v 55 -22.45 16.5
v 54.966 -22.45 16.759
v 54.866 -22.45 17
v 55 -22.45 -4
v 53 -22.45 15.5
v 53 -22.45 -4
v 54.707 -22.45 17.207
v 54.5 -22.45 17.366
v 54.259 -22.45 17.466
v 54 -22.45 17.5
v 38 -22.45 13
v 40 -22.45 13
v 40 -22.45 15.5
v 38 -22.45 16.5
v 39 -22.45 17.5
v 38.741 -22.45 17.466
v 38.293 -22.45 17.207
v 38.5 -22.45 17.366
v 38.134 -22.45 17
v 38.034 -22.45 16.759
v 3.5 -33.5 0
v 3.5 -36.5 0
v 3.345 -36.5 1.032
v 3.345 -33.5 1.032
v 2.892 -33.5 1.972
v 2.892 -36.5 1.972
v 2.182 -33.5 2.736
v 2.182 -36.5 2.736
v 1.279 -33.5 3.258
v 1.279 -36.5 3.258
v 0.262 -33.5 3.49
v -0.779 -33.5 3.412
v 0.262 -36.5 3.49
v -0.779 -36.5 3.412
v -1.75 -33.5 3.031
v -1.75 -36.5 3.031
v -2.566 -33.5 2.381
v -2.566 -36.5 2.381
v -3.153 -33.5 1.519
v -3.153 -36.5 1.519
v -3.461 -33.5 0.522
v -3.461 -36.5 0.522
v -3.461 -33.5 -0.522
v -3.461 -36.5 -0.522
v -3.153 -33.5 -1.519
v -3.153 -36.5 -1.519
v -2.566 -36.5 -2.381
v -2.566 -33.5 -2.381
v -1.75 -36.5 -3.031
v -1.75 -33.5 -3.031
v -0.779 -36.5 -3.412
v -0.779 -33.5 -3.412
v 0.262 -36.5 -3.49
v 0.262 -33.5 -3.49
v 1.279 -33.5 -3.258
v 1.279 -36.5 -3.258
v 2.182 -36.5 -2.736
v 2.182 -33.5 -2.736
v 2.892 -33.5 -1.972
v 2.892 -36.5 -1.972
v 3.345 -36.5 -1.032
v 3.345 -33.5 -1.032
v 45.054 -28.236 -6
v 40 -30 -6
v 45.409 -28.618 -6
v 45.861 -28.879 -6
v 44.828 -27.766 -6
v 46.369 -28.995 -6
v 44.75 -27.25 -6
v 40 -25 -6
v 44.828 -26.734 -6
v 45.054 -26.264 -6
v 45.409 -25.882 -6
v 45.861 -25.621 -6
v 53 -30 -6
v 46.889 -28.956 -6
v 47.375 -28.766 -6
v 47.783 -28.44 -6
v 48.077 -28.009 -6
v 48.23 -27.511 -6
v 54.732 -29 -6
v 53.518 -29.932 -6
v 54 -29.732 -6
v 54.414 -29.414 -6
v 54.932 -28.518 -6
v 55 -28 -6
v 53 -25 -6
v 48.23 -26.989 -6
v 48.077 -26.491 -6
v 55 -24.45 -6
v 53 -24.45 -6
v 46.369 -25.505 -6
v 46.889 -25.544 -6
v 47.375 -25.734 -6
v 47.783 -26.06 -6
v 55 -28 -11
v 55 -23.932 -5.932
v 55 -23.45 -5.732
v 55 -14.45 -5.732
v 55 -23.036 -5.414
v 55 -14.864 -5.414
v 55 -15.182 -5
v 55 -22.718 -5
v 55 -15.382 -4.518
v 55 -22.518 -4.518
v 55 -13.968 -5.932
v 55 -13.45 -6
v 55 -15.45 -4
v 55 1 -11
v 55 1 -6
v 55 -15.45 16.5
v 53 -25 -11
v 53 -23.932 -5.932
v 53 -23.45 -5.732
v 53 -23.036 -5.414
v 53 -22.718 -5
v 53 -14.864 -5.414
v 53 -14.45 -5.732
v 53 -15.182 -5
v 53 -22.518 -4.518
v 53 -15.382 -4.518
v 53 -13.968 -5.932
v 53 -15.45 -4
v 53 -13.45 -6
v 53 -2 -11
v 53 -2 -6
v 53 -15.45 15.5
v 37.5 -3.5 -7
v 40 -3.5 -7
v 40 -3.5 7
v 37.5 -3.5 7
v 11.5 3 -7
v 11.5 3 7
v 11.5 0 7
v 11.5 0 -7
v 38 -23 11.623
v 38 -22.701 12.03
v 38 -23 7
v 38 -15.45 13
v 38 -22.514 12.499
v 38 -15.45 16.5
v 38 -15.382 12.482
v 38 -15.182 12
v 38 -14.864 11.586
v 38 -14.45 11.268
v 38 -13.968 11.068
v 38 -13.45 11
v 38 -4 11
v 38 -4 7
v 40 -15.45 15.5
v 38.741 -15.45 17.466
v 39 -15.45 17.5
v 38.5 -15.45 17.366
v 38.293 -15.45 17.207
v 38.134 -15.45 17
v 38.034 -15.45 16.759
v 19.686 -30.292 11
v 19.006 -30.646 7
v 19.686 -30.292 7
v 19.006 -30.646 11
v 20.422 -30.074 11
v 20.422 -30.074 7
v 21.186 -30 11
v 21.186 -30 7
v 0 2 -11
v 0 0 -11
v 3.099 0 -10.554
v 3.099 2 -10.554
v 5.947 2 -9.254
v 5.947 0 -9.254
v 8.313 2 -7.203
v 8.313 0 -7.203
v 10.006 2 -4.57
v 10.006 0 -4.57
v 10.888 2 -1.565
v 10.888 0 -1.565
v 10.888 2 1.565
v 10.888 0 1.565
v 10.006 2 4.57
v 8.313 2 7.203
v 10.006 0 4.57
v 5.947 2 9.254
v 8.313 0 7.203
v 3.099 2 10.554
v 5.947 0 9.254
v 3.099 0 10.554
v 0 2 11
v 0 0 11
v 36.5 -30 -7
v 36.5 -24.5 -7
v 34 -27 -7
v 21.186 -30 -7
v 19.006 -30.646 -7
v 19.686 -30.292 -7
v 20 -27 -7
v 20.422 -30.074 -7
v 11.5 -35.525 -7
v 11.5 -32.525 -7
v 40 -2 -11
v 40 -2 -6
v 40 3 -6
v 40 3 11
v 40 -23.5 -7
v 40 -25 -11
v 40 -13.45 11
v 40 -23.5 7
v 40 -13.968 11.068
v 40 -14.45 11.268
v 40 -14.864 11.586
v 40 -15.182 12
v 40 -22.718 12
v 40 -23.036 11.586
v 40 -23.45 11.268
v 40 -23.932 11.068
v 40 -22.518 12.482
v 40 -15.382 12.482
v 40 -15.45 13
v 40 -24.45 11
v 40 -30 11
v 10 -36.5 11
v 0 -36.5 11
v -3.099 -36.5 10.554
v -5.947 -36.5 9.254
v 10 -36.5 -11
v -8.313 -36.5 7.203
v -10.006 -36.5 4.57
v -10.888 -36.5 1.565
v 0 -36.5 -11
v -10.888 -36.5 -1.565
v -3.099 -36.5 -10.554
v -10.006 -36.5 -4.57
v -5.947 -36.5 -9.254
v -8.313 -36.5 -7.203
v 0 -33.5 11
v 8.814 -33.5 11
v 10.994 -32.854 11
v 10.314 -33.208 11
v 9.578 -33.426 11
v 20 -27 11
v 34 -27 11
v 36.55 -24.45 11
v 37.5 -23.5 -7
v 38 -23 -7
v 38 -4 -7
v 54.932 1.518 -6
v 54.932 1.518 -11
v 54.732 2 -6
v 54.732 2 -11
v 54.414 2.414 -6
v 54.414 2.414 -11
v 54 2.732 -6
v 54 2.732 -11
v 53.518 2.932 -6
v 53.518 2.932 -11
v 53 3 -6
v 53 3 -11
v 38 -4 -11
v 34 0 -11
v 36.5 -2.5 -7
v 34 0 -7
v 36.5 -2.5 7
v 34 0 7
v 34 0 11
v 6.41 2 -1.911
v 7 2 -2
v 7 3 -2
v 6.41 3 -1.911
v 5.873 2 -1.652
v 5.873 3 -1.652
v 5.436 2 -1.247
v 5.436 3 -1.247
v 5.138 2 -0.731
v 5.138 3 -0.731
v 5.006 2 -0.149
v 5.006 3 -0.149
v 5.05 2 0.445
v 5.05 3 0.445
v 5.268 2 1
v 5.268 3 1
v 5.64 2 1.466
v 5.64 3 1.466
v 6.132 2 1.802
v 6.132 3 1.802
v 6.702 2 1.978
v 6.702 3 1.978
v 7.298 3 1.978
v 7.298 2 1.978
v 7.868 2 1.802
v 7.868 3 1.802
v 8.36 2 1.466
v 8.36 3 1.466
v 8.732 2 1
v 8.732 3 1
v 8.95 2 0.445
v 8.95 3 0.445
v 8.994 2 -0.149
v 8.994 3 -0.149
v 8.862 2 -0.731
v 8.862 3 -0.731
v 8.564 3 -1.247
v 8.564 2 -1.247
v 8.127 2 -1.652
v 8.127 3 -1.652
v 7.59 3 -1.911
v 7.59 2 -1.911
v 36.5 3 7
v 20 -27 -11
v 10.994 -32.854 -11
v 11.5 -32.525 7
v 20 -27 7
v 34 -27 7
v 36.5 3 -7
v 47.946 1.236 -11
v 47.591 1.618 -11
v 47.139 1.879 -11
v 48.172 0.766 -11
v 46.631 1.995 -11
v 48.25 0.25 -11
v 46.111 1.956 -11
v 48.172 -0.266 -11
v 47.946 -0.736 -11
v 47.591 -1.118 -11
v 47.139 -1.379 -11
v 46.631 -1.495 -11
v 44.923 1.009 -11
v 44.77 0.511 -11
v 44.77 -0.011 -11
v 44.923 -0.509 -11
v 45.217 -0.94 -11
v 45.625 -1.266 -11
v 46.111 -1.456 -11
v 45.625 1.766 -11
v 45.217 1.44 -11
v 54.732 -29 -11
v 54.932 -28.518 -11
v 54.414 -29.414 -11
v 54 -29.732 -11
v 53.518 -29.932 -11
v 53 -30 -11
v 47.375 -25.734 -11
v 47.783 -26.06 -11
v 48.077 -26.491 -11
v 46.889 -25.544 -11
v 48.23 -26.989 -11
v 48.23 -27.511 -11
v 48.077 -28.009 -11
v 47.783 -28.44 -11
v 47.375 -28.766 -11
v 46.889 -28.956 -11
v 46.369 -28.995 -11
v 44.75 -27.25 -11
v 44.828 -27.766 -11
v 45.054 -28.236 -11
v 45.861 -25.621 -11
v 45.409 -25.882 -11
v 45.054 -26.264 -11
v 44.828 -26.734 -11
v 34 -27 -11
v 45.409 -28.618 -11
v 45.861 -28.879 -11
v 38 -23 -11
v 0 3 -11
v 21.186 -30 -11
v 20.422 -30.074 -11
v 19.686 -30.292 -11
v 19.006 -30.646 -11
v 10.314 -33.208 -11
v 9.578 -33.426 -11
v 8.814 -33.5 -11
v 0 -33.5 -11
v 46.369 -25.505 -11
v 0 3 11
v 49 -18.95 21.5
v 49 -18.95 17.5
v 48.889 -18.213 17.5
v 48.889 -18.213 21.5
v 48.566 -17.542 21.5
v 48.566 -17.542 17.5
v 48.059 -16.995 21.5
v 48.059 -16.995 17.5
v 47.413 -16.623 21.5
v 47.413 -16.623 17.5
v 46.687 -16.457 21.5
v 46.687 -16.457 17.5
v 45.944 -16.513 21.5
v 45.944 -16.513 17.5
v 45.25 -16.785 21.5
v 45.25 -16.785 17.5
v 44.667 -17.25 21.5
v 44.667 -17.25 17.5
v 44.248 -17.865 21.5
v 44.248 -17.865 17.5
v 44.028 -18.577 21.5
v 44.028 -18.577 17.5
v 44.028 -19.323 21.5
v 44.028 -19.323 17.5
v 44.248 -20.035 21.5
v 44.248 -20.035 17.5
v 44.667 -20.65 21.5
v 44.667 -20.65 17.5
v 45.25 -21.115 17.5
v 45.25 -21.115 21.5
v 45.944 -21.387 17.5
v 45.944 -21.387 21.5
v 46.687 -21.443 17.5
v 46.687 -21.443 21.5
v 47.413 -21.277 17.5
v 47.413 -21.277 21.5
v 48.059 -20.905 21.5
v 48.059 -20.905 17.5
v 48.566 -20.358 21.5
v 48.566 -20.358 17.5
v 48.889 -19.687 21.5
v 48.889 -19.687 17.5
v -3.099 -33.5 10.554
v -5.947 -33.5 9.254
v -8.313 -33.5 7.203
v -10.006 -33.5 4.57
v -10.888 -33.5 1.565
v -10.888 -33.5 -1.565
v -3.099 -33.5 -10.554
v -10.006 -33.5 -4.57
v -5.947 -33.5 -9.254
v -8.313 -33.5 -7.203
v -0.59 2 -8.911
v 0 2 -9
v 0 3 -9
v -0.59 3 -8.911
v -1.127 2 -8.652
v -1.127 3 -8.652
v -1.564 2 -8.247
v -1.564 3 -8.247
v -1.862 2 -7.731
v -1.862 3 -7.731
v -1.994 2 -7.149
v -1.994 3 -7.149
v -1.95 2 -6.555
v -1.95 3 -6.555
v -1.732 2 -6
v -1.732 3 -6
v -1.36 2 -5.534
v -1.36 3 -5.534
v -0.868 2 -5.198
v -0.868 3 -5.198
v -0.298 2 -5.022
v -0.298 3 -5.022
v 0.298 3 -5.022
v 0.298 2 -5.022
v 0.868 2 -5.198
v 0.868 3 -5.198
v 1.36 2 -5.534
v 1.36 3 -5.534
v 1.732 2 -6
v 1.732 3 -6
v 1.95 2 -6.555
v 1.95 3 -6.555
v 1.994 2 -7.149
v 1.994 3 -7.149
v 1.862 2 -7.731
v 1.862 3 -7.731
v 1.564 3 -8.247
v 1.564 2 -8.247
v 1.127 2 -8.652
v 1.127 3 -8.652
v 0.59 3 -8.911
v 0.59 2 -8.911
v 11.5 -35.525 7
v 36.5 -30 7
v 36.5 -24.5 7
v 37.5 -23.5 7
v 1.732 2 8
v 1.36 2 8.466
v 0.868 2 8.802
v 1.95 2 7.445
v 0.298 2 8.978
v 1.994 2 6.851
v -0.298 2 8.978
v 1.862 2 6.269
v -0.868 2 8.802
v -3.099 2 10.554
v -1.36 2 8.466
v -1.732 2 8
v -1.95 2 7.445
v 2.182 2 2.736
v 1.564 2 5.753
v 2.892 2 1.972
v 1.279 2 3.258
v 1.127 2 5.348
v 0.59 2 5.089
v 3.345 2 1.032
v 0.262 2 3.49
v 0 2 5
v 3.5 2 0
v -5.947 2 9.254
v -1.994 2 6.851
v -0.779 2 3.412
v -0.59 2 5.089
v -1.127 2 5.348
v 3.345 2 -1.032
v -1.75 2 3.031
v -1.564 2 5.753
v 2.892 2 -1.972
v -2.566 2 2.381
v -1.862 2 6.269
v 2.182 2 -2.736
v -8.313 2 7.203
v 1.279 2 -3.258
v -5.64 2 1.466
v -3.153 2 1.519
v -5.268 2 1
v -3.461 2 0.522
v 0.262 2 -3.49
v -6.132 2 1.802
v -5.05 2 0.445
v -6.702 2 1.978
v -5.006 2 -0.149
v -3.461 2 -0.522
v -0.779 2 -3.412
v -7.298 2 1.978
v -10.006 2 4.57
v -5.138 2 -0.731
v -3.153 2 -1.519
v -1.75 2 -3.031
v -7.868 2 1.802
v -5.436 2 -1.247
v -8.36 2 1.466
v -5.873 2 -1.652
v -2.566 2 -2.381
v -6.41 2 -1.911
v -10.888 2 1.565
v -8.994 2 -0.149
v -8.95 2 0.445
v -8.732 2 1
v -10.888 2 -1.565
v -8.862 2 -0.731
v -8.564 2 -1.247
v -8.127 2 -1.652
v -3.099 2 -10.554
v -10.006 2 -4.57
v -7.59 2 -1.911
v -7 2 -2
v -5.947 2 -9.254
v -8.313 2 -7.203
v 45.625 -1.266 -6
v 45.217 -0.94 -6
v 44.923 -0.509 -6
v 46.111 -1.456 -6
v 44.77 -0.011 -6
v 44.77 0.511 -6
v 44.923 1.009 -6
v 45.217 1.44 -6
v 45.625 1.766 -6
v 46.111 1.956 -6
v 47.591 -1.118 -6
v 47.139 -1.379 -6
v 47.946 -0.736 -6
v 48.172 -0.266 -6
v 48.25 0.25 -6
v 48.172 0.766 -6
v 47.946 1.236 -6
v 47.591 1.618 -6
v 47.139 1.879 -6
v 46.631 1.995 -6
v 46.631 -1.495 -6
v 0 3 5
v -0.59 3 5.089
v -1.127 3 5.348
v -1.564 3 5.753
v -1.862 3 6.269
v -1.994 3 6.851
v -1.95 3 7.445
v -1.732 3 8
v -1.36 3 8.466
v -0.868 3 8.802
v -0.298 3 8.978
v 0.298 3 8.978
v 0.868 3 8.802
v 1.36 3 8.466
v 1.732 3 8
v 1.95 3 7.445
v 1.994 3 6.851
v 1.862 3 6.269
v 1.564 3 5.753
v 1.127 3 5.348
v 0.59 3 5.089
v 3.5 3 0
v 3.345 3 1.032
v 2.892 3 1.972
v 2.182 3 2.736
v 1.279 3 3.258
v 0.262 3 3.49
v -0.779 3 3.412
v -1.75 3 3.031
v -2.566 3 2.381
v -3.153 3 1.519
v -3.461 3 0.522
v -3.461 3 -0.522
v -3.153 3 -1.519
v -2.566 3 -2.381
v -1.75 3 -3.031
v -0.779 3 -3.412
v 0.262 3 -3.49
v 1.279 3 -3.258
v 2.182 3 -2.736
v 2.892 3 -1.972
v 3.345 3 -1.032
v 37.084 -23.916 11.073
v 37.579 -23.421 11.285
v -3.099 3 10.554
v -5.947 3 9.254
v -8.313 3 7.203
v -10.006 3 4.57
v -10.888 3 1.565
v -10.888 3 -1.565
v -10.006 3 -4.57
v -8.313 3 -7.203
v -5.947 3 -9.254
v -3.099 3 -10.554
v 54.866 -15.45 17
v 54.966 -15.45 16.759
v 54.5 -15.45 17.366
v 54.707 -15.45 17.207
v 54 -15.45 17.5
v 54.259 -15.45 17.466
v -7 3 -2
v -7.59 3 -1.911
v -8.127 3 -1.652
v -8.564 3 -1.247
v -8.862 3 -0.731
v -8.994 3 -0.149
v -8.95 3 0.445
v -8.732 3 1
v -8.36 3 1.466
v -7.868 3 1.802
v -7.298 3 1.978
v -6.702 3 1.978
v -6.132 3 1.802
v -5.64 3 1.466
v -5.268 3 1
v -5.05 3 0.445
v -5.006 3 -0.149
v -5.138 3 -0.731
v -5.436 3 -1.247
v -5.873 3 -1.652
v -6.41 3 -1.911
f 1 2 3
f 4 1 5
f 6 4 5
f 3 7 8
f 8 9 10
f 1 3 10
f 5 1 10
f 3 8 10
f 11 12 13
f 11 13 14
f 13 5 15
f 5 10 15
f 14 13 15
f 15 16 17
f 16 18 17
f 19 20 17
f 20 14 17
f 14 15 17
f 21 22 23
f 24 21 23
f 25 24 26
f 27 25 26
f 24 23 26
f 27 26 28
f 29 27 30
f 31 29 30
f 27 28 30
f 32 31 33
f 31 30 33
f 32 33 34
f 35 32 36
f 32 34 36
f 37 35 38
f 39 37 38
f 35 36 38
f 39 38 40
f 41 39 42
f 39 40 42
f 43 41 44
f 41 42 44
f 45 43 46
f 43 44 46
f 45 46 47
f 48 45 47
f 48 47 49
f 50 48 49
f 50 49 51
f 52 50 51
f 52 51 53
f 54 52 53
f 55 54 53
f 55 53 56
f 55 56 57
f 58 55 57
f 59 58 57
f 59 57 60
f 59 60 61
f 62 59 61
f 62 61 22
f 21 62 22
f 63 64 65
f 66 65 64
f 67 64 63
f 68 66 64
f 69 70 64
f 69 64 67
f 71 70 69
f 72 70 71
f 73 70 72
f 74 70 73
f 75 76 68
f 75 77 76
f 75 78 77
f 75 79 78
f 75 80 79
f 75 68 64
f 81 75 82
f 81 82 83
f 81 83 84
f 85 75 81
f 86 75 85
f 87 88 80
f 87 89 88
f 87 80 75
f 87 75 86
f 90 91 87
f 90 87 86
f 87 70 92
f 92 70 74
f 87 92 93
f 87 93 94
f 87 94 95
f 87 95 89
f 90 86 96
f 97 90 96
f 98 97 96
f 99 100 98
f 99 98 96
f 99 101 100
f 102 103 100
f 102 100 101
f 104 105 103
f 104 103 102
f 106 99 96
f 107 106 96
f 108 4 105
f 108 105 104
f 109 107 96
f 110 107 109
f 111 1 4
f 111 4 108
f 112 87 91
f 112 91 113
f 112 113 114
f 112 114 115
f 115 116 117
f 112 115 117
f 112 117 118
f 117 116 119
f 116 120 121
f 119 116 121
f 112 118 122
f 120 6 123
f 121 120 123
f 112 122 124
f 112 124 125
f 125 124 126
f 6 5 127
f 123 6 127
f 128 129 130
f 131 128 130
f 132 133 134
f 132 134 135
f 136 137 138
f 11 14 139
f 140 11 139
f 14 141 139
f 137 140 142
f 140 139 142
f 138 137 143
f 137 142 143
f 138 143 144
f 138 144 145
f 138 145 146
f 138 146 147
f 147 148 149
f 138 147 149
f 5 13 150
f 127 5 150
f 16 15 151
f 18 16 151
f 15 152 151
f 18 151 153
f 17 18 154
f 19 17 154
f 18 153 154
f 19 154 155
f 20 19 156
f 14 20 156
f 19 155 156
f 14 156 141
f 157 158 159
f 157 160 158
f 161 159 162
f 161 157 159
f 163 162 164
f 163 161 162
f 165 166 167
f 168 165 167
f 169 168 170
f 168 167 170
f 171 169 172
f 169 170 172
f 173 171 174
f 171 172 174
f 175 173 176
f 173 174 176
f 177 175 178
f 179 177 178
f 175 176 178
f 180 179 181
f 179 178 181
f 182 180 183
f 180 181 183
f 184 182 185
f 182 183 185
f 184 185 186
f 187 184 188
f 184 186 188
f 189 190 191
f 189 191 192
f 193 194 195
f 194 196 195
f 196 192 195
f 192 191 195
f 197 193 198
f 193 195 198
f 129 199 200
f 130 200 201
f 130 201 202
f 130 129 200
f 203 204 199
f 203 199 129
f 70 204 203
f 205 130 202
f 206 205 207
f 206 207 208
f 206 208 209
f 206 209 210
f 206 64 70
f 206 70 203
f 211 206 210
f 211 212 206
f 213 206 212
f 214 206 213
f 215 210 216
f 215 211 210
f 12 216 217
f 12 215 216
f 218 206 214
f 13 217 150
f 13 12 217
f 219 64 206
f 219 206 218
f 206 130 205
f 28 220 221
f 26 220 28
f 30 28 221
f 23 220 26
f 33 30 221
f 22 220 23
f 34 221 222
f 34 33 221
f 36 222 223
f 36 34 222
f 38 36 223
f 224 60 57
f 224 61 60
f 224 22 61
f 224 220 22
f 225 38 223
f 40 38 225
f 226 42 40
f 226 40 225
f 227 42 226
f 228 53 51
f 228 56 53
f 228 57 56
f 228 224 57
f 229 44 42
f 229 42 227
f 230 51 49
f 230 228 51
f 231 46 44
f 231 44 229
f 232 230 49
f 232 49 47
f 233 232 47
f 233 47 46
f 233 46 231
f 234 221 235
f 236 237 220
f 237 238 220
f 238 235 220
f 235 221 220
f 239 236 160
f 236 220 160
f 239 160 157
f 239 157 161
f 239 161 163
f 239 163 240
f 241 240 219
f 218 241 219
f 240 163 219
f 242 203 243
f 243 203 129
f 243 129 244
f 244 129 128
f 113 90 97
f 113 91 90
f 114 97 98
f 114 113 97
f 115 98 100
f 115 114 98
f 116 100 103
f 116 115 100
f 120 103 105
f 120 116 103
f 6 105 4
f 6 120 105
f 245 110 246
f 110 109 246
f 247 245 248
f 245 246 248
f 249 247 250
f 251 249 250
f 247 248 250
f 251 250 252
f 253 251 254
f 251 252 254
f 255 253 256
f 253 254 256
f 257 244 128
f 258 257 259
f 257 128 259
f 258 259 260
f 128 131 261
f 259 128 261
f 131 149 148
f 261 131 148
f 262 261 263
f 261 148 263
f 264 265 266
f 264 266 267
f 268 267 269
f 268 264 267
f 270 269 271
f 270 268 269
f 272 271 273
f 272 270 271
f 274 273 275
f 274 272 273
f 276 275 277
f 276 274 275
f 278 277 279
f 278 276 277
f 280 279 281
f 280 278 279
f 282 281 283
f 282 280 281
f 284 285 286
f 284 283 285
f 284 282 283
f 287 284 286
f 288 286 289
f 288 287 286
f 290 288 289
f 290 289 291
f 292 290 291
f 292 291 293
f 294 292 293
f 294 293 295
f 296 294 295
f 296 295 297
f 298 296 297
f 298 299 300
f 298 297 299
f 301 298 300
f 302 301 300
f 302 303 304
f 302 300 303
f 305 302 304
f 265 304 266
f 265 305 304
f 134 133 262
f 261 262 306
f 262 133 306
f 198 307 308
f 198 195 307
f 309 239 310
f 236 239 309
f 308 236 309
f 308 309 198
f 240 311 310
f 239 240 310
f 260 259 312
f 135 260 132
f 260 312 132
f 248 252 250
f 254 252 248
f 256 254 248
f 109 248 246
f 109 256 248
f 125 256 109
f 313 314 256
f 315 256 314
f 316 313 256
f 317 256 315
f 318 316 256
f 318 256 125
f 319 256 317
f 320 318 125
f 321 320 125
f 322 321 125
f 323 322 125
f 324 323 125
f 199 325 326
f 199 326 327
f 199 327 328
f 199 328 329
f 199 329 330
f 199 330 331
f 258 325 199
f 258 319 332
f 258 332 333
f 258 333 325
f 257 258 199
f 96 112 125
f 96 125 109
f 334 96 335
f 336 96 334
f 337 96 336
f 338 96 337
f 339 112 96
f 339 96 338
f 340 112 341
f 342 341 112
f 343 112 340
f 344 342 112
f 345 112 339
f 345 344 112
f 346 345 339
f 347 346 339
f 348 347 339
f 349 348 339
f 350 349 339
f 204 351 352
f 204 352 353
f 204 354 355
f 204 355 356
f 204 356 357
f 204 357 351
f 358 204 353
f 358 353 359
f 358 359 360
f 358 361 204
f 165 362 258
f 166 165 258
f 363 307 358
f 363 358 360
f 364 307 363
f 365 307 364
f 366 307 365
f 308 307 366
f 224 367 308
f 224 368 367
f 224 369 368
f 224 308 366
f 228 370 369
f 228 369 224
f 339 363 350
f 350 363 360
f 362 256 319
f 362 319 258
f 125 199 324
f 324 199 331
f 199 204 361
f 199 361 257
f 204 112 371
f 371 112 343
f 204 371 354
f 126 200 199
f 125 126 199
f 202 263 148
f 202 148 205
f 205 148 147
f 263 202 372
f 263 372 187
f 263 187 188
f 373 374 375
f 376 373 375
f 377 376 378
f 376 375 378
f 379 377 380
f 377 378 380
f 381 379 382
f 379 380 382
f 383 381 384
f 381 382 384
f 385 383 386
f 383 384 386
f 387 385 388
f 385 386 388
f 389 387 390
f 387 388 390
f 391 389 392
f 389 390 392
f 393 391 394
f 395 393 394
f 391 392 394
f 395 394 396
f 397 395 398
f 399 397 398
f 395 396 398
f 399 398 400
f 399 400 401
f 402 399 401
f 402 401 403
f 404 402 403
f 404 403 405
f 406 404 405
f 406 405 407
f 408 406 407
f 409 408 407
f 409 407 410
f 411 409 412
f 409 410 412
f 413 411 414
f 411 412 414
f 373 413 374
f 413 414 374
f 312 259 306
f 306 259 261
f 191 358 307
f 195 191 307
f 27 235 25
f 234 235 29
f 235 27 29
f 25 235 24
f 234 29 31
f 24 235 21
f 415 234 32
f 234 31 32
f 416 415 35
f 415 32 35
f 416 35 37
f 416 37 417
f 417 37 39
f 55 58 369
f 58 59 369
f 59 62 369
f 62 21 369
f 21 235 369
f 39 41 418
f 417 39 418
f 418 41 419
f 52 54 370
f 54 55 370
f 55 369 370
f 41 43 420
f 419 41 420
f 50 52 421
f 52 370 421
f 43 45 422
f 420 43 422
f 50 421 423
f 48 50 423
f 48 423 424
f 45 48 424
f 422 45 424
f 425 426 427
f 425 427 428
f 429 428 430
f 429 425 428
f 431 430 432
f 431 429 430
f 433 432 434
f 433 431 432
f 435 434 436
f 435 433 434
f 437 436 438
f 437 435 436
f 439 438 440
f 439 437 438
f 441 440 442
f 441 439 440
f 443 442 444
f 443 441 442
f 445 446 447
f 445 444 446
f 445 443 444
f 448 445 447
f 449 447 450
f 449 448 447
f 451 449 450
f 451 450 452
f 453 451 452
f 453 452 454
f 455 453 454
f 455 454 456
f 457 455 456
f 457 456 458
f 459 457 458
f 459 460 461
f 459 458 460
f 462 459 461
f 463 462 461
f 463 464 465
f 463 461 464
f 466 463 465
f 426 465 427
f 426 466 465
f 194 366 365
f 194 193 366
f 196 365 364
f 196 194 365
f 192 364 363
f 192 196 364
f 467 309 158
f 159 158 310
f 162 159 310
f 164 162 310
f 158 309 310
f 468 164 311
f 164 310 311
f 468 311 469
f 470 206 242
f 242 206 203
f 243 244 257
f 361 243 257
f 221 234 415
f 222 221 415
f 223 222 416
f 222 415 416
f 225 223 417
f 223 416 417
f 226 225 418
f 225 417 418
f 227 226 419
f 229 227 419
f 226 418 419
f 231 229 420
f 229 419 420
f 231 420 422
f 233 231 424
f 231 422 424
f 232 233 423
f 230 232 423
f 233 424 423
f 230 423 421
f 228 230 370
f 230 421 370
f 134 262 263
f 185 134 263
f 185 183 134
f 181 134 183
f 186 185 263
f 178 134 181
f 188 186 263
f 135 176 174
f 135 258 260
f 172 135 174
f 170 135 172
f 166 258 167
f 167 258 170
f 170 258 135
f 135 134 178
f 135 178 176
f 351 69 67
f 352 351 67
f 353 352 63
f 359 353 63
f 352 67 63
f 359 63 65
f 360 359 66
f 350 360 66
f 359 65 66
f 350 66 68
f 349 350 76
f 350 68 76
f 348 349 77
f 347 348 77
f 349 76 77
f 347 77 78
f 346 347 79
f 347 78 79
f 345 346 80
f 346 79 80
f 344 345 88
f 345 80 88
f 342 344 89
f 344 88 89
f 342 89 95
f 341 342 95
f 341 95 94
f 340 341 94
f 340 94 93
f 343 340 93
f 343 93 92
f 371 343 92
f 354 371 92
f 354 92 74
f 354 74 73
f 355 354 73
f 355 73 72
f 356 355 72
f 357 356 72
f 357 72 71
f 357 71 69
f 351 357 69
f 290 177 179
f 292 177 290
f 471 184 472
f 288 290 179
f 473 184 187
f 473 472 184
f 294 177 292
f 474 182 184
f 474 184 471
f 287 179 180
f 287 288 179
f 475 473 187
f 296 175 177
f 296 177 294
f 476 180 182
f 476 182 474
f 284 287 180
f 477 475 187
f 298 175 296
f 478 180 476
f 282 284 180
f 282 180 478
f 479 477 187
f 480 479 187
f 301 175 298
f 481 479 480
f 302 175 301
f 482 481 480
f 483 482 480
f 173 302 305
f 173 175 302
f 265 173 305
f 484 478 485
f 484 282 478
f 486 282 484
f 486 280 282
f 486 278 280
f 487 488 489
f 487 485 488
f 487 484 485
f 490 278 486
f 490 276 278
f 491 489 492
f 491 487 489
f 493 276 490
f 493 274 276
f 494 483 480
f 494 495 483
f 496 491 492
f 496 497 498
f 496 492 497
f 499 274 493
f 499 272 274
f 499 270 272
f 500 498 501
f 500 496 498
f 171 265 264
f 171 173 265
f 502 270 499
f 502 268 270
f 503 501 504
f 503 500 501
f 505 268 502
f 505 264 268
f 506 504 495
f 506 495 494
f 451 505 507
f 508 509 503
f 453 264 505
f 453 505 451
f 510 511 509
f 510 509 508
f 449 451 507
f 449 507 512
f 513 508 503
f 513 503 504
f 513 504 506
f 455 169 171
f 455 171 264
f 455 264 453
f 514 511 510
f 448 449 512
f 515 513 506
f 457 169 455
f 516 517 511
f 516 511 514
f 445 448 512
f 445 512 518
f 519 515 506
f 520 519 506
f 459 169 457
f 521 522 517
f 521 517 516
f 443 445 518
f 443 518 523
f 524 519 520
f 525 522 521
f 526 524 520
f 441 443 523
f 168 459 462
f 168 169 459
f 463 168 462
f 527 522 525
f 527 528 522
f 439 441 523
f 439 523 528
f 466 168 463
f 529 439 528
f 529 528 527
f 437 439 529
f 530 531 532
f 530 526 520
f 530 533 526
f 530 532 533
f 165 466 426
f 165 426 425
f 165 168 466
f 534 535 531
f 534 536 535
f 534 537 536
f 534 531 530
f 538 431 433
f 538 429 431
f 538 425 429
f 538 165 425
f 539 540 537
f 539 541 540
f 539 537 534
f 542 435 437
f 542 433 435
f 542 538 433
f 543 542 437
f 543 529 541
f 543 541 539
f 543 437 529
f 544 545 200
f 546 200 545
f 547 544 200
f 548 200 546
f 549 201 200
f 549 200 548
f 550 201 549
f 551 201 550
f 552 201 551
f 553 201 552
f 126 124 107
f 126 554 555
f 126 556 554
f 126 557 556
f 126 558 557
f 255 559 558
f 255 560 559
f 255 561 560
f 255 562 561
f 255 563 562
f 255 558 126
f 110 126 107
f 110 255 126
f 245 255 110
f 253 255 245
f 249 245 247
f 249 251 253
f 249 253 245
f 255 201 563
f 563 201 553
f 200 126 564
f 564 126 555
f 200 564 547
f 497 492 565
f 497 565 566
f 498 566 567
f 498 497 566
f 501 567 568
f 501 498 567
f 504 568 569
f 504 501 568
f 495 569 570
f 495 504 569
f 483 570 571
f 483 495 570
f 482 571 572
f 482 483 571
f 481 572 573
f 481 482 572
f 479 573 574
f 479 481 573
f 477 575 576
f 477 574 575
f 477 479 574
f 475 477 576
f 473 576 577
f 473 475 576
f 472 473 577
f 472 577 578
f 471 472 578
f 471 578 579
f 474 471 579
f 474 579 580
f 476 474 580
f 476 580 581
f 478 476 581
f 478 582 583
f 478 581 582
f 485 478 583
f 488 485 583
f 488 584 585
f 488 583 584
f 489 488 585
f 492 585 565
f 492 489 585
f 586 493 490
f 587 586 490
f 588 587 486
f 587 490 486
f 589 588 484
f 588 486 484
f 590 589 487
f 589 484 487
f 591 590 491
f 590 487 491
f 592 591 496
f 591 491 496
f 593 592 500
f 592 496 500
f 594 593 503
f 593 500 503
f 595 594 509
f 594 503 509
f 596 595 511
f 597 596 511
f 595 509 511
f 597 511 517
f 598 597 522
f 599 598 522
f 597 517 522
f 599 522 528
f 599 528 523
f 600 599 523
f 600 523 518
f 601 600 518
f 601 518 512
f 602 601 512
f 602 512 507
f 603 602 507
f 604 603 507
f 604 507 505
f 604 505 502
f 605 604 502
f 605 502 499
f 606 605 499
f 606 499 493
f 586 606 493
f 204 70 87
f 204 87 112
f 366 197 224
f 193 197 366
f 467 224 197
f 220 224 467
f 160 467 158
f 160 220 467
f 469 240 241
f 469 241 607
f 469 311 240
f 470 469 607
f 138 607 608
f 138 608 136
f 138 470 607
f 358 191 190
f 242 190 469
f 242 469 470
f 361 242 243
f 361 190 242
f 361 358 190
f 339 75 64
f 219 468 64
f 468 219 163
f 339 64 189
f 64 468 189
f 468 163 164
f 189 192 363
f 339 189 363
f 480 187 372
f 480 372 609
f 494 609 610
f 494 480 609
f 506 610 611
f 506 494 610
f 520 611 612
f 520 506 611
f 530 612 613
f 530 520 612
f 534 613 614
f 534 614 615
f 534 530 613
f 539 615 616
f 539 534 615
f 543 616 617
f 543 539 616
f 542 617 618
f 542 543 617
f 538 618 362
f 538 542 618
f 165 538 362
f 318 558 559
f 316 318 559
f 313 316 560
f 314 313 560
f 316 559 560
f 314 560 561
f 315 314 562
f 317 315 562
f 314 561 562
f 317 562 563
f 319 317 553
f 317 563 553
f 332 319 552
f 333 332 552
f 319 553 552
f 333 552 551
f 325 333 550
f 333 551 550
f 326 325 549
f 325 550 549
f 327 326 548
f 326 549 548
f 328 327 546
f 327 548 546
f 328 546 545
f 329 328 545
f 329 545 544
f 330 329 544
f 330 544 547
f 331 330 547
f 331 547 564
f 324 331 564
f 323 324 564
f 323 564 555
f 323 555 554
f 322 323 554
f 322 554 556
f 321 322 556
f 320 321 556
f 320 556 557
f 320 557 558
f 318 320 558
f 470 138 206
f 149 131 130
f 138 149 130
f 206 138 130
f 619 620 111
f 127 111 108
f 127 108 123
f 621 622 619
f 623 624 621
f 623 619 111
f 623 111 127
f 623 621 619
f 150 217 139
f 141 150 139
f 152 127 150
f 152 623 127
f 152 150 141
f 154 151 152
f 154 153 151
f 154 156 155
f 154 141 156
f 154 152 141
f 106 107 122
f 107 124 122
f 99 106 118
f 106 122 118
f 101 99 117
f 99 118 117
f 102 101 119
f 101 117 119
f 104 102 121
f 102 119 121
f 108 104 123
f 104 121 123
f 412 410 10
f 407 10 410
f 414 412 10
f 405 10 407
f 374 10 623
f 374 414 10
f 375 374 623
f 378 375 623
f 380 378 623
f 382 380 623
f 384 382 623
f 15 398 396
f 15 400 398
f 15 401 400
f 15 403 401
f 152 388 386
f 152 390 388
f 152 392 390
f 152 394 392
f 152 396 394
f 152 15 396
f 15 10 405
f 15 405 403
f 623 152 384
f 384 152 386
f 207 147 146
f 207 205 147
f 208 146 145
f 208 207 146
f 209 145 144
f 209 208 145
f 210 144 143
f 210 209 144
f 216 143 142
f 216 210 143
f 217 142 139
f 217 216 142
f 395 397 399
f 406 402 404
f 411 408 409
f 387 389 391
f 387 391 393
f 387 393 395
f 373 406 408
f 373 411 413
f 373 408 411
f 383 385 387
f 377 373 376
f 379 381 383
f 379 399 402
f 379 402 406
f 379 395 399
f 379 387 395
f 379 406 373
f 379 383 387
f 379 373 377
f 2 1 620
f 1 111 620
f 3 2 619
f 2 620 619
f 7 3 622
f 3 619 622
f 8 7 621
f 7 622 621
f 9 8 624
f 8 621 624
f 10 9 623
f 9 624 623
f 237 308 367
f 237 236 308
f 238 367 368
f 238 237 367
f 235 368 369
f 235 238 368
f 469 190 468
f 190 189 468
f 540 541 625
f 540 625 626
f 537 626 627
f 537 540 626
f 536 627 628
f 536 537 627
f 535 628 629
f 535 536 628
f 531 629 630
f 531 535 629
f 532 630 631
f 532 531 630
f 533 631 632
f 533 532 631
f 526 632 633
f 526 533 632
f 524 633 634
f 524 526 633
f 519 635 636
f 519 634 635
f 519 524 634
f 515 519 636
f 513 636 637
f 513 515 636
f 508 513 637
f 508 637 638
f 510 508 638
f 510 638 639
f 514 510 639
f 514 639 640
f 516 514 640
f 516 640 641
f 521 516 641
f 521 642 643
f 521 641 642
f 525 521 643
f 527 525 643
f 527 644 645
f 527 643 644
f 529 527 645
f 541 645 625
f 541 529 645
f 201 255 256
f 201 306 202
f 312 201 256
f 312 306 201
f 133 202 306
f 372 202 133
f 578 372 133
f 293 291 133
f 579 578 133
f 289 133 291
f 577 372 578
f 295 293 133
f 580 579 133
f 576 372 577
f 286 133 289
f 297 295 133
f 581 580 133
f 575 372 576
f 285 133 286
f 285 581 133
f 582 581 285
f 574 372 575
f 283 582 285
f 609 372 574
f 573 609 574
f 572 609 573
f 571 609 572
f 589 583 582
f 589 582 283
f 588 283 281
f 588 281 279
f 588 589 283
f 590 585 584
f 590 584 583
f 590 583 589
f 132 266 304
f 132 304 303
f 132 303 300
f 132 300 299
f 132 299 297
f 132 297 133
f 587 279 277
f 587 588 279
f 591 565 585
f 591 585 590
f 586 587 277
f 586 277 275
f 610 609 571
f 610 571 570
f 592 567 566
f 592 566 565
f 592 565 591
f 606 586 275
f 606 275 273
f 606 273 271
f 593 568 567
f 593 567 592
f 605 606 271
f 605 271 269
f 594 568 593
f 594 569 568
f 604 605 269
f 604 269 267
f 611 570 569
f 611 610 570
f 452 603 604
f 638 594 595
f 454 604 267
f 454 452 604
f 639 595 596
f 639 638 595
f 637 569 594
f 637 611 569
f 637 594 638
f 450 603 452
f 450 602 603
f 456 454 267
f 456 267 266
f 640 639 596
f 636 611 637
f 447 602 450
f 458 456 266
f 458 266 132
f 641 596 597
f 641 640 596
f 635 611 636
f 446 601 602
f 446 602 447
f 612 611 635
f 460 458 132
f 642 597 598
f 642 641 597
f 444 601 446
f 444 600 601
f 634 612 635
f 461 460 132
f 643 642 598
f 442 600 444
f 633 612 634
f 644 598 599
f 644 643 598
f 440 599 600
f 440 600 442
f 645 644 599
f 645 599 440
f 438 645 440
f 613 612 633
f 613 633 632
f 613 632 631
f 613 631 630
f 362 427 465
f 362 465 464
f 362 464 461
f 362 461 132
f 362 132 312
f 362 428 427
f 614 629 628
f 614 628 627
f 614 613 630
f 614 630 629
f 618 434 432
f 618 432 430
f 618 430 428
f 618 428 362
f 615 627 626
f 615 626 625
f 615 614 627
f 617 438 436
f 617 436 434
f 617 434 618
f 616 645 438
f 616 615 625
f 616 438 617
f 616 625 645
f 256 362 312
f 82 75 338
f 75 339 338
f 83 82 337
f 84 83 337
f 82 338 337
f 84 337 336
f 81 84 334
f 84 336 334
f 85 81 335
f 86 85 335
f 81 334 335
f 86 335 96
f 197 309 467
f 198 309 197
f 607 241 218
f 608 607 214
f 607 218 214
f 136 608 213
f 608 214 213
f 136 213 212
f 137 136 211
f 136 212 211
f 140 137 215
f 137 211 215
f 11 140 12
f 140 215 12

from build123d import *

# Parameters (mm, degrees)
EXTRUDE_1_DEPTH             = 3
SKETCH_3_R                  = 11
CUT_EXTRUDE_1_DEPTH         = 2
CUT_EXTRUDE_2_DEPTH         = 20
CUT_EXTRUDE_2_DEPTH_BACK    = 42.593268686
SKETCH_1_R                  = 3
SKETCH_1_R_2                = 2
EXTRUDE_2_DEPTH             = 3
SKETCH_5_R                  = 3.5
CUT_EXTRUDE_3_DEPTH         = 58.282196187
SKETCH_8_W                  = 20
SKETCH_8_H                  = 22
EXTRUDE_4_DEPTH             = 3
EXTRUDE_5_REACH             = 57.256
EXTRUDE_5_DIRECTION_2_REACH = 57.256
SKETCH_11_W                 = 5
SKETCH_11_H                 = 5
EXTRUDE_6_DEPTH             = 15
EXTRUDE_6_2_DEPTH           = 15
SKETCH_13_W                 = 2
SKETCH_13_H                 = 22
EXTRUDE_7_DEPTH             = 33
SKETCH_15_W                 = 2
SKETCH_15_H                 = 5
EXTRUDE_8_DEPTH             = 28
SKETCH_14_R                 = 1.75
CUT_EXTRUDE_4_DEPTH         = 69.163406605
SKETCH_16_W                 = 2
SKETCH_16_H                 = 7
EXTRUDE_9_DEPTH             = 6.5
SKETCH_17_W                 = 2
SKETCH_17_H                 = 7
EXTRUDE_10_DEPTH            = 15
SKETCH_18_W                 = 2
SKETCH_18_H                 = 7
EXTRUDE_11_DEPTH            = 21.5
SKETCH_19_R                 = 2.5
EXTRUDE_12_DEPTH            = 4
CUT_EXTRUDE_5_REACH         = 66.773
SKETCH_20_W                 = 14
SKETCH_20_H                 = 20
SKETCH_21_W                 = 25
SKETCH_21_H                 = 14
CUT_EXTRUDE_6_DEPTH         = 72.045759902
CHAMFER_1_SIZE              = 4
FILLET_1_R                  = 4
FILLET_2_R                  = 2
FILLET_3_R                  = 2
FILLET_4_R                  = 1


with BuildPart() as part:
    # 草图2 → 凸台-拉伸1 (new body)
    with BuildSketch(Plane(origin=(0, 0, 0), x_dir=(1, 0, 0), z_dir=(0, 1, 0))):
        with BuildLine():
            Line((0, 11), (40, 11))
            Line((40, 11), (40, -11))
            Line((40, -11), (0, -11))
            ThreePointArc((0, -11), (-11, 0), (0, 11))
        make_face()
    extrude(amount=EXTRUDE_1_DEPTH)

    # 草图3 → 切除-拉伸1 (cut)
    with BuildSketch(Plane(origin=(0, 0, 0), x_dir=(-1, 0, 0), z_dir=(0, -1, 0))):
        Circle(SKETCH_3_R)
    extrude(amount=-CUT_EXTRUDE_1_DEPTH, mode=Mode.SUBTRACT)

    # 草图1 → 切除-拉伸2 (cut, two sides: drawn at the far end of the back side and taken through both)
    with BuildSketch(Plane(origin=(0, 0, 0), x_dir=(1, 0, 0), z_dir=(0, 1, 0)).offset(-CUT_EXTRUDE_2_DEPTH_BACK)):
        with Locations(Location((0, 0, 0), (0, 0, 90))):
            Circle(SKETCH_1_R)
        with Locations(Location((-7, 0, 0), (0, 0, 90))):
            Circle(SKETCH_1_R_2)
        with Locations(Location((0, 7, 0), (0, 0, 90))):
            Circle(SKETCH_1_R_2)
        with Locations(Location((7, 0, 0), (0, 0, 90))):
            Circle(SKETCH_1_R_2)
        with Locations(Location((0, -7, 0), (0, 0, 90))):
            Circle(SKETCH_1_R_2)
    extrude(amount=CUT_EXTRUDE_2_DEPTH + CUT_EXTRUDE_2_DEPTH_BACK, mode=Mode.SUBTRACT)


with BuildPart() as body_2:
    # 草图4 → 凸台-拉伸2 (new body)
    with BuildSketch(Plane(origin=(0, -33.5, 0), x_dir=(-1, 0, 0), z_dir=(0, -1, 0))):
        with BuildLine():
            Line((0, 11), (-10, 11))
            Line((-10, 11), (-10, -11))
            Line((-10, -11), (0, -11))
            ThreePointArc((0, -11), (11, 0), (0, 11))
        make_face()
    extrude(amount=EXTRUDE_2_DEPTH)


with BuildPart() as cut_extrude_3_tool:
    # 草图5 → 切除-拉伸3 (new, through all)
    with BuildSketch(Plane(origin=(0, -36.5, 0), x_dir=(-1, 0, 0), z_dir=(0, -1, 0))):
        with Locations(Location((0, 0, 0), (0, 0, 180))):
            Circle(SKETCH_5_R)
    extrude(amount=-CUT_EXTRUDE_3_DEPTH)


with BuildPart() as part_1:
    add(part.part)

    # 切除-拉伸3: cut by cut_extrude_3_tool
    add(cut_extrude_3_tool.part, mode=Mode.SUBTRACT)



with BuildPart() as body_2_1:
    add(body_2.part)

    # 切除-拉伸3: cut by cut_extrude_3_tool
    add(cut_extrude_3_tool.part, mode=Mode.SUBTRACT)


with BuildPart() as body_3:
    # 草图8 → 凸台-拉伸4 (new body)
    with BuildSketch(Plane(origin=(0, -27, 0), x_dir=(-1, 0, 0), z_dir=(0, -1, 0))):
        with Locations((-30, 0)):
            Rectangle(SKETCH_8_W, SKETCH_8_H)
    extrude(amount=EXTRUDE_4_DEPTH)

    # 凸台-拉伸5: up to this face of the body (flat: up to its plane)
    extrude_5_end = Plane(body_3.part.faces().sort_by_distance((30, -28.5, 11))[0])
    # 草图10 → 凸台-拉伸5 (add, up to the picked face)
    with BuildSketch(Plane.XY, mode=Mode.PRIVATE) as extrude_5_sk1:
        Polygon((10, -36.5), (20, -30), (20, -27), (10, -33.5), align=None)
    extrude_5_tool1 = split(extrude(extrude_5_sk1.sketch, amount=EXTRUDE_5_REACH, mode=Mode.PRIVATE), bisect_by=extrude_5_end, keep=Keep.BOTH, mode=Mode.PRIVATE)

    add(body_2_1.part)  # 凸台-拉伸5 merges body 2
    add(extrude_5_tool1.solids().sort_by(Axis((15, -31.75, 0), (0, 0, 1)))[0])

    # 凸台-拉伸5 direction 2: up to this face of the body (flat: up to its plane)
    extrude_5_direction_2_end = Plane(body_3.part.faces().sort_by_distance((30, -28.5, -11))[0])
    # 草图10 → 凸台-拉伸5 direction 2 (add, up to the picked face)
    with BuildSketch(Plane.XY, mode=Mode.PRIVATE) as extrude_5_direction_2_sk1:
        Polygon((10, -36.5), (20, -30), (20, -27), (10, -33.5), align=None)
    extrude_5_direction_2_tool1 = split(extrude(extrude_5_direction_2_sk1.sketch, amount=-EXTRUDE_5_DIRECTION_2_REACH, mode=Mode.PRIVATE), bisect_by=extrude_5_direction_2_end, keep=Keep.BOTH, mode=Mode.PRIVATE)
    add(extrude_5_direction_2_tool1.solids().sort_by(Axis((15, -31.75, 0), (0, 0, -1)))[0])


with BuildPart() as body_3_2:
    # 草图11 → 凸台-拉伸6 (new body)
    with BuildSketch(Plane(origin=(40, 0, 0), x_dir=(0, 0, -1), z_dir=(1, 0, 0))):
        with Locations((8.5, 0.5)):
            Rectangle(SKETCH_11_W, SKETCH_11_H)
    extrude(amount=EXTRUDE_6_DEPTH)


with BuildPart() as body_4:
    # 草图11 → Extrude 6 2 (new body)
    with BuildSketch(Plane(origin=(40, 0, 0), x_dir=(0, 0, -1), z_dir=(1, 0, 0))):
        with Locations((8.5, -27.5)):
            Rectangle(SKETCH_11_W, SKETCH_11_H)
    extrude(amount=EXTRUDE_6_2_DEPTH)


with BuildPart() as part_2:
    add(part_1.part)

    add(body_3.part)  # 凸台-拉伸7 merges body 3

    add(body_3_2.part)  # 凸台-拉伸7 merges body 3 2

    add(body_4.part)  # 凸台-拉伸7 merges body 4
    # 草图13 → 凸台-拉伸7 (add)
    with BuildSketch(Plane(origin=(0, 3, 0), x_dir=(1, 0, 0), z_dir=(0, 1, 0))):
        with Locations((39, 0)):
            Rectangle(SKETCH_13_W, SKETCH_13_H)
    extrude(amount=-EXTRUDE_7_DEPTH)

    # 草图15 → 凸台-拉伸8 (add)
    with BuildSketch(Plane.XZ.offset(2)):
        with Locations((54, -8.5)):
            Rectangle(SKETCH_15_W, SKETCH_15_H)
    extrude(amount=EXTRUDE_8_DEPTH)

    # 草图14 → 切除-拉伸4 (cut, through all)
    with BuildSketch(Plane.XY.offset(-6)):
        with Locations((46.5, 0.25)):
            Circle(SKETCH_14_R)
        with Locations(Location((46.5, -27.25, 0), (0, 0, 180))):
            Circle(SKETCH_14_R)
    extrude(amount=-CUT_EXTRUDE_4_DEPTH, mode=Mode.SUBTRACT)

    # 草图16 → 凸台-拉伸9 (add)
    with BuildSketch(Plane.XY.offset(11)):
        with Locations((39, -18.95)):
            Rectangle(SKETCH_16_W, SKETCH_16_H)
    extrude(amount=EXTRUDE_9_DEPTH)

    # 草图17 → 凸台-拉伸10 (add)
    with BuildSketch(Plane(origin=(40, 0, 0), x_dir=(0, 0, -1), z_dir=(1, 0, 0))):
        with Locations((-16.5, -18.95)):
            Rectangle(SKETCH_17_W, SKETCH_17_H)
    extrude(amount=EXTRUDE_10_DEPTH)

    # 草图18 → 凸台-拉伸11 (add)
    with BuildSketch(Plane(origin=(0, 0, 15.5), x_dir=(-1, 0, 0), z_dir=(0, 0, -1))):
        with Locations((-54, -18.95)):
            Rectangle(SKETCH_18_W, SKETCH_18_H)
    extrude(amount=EXTRUDE_11_DEPTH)

    # 草图19 → 凸台-拉伸12 (add)
    with BuildSketch(Plane.XY.offset(17.5)):
        with Locations((46.5, -18.95)):
            Circle(SKETCH_19_R)
    extrude(amount=EXTRUDE_12_DEPTH)

    # 草图20 → 切除-拉伸5 (cut, up to next)
    with BuildSketch(Plane.ZY.offset(-38), mode=Mode.PRIVATE) as cut_extrude_5_sk1:
        with Locations((0, -13.5)):
            Rectangle(SKETCH_20_W, SKETCH_20_H)
    cut_extrude_5_tool1 = extrude(cut_extrude_5_sk1.sketch, amount=-CUT_EXTRUDE_5_REACH, mode=Mode.PRIVATE) & part_2.part
    add(cut_extrude_5_tool1.solids().sort_by_distance((38, -13.5, 0))[0], mode=Mode.SUBTRACT)

    # 草图21 → 切除-拉伸6 (cut, through all)
    with BuildSketch(Plane(origin=(0, 3, 0), x_dir=(1, 0, 0), z_dir=(0, 1, 0))):
        with Locations((24, 0)):
            Rectangle(SKETCH_21_W, SKETCH_21_H)
    extrude(amount=-CUT_EXTRUDE_6_DEPTH, mode=Mode.SUBTRACT)

    # 倒角1
    # the kernel refuses this chamfer: 4 mm, written as the material it adds along each edge
    with BuildSketch(Plane(origin=(38, -27, -11), x_dir=(-0.999621916911297, -0.027495876610579655, 0), z_dir=(0, 0, 1))) as chamfer_1_piece_1_section:
        Polygon((CHAMFER_1_SIZE * 0.999621916911, -CHAMFER_1_SIZE * 0.0274958766106), (-CHAMFER_1_SIZE * 0.0274958766106, -CHAMFER_1_SIZE * 0.999621916911), (0, 0), align=None)
    chamfer_1_piece_1 = extrude(amount=32.286731952, mode=Mode.PRIVATE)
    chamfer_1_piece_1 = split(chamfer_1_piece_1, bisect_by=Plane(origin=(35.666666667, -26.166666667, -7), z_dir=(0, 0, -1)), keep=Keep.TOP, mode=Mode.PRIVATE)
    add(chamfer_1_piece_1)
    with BuildSketch(Plane(origin=(38, -27, -11), x_dir=(-0.999621916911297, -0.027495876610579655, 0), z_dir=(0, 0, 1))) as chamfer_1_piece_2_section:
        Polygon((CHAMFER_1_SIZE * 0.999621916911, -CHAMFER_1_SIZE * 0.0274958766106), (-CHAMFER_1_SIZE * 0.0274958766106, -CHAMFER_1_SIZE * 0.999621916911), (0, 0), align=None)
    chamfer_1_piece_2 = extrude(amount=22, mode=Mode.PRIVATE)
    chamfer_1_piece_2 = split(chamfer_1_piece_2, bisect_by=Plane(origin=(36.5, -25.399122807, 0), z_dir=(1, 0, 0)), keep=Keep.TOP, mode=Mode.PRIVATE)
    chamfer_1_piece_2 = split(chamfer_1_piece_2, bisect_by=Plane(origin=(37.293859649, -23.5, 0), z_dir=(0, -1, 0)), keep=Keep.TOP, mode=Mode.PRIVATE)
    add(chamfer_1_piece_2)
    with BuildSketch(Plane(origin=(38, -27, -21.286731952), x_dir=(-0.999621916911297, -0.02749587661057961, 0), z_dir=(0, 0, 1))) as chamfer_1_piece_3_section:
        Polygon((CHAMFER_1_SIZE * 0.999621916911, -CHAMFER_1_SIZE * 0.0274958766106), (-CHAMFER_1_SIZE * 0.0274958766106, -CHAMFER_1_SIZE * 0.999621916911), (0, 0), align=None)
    chamfer_1_piece_3 = extrude(amount=32.286731952, mode=Mode.PRIVATE)
    chamfer_1_piece_3 = split(chamfer_1_piece_3, bisect_by=Plane(origin=(35.666666667, -26.166666667, 7), z_dir=(0, 0, 1)), keep=Keep.TOP, mode=Mode.PRIVATE)
    add(chamfer_1_piece_3)
    with BuildSketch(Plane(origin=(38, 0, 11), x_dir=(0.02749587661058563, -0.9996219169112968, 0), z_dir=(0, 0, -1))) as chamfer_1_piece_4_section:
        Polygon((CHAMFER_1_SIZE * 0.999621916911, CHAMFER_1_SIZE * 0.0274958766106), (-CHAMFER_1_SIZE * 0.0274958766106, CHAMFER_1_SIZE * 0.999621916911), (0, 0), align=None)
    chamfer_1_piece_4 = extrude(amount=32.286731952, mode=Mode.PRIVATE)
    chamfer_1_piece_4 = split(chamfer_1_piece_4, bisect_by=Plane(origin=(37.833333333, -3.666666667, 7), z_dir=(0, 0, 1)), keep=Keep.TOP, mode=Mode.PRIVATE)
    add(chamfer_1_piece_4)
    with BuildSketch(Plane(origin=(38, 0, 21.286731952), x_dir=(0.02749587661058563, -0.9996219169112968, 0), z_dir=(0, 0, -1))) as chamfer_1_piece_5_section:
        Polygon((CHAMFER_1_SIZE * 0.999621916911, CHAMFER_1_SIZE * 0.0274958766106), (-CHAMFER_1_SIZE * 0.0274958766106, CHAMFER_1_SIZE * 0.999621916911), (0, 0), align=None)
    chamfer_1_piece_5 = extrude(amount=32.286731952, mode=Mode.PRIVATE)
    chamfer_1_piece_5 = split(chamfer_1_piece_5, bisect_by=Plane(origin=(37.293859649, -1.600877193, 7), z_dir=(0, 0, -1)), keep=Keep.TOP, mode=Mode.PRIVATE)
    chamfer_1_piece_5 = split(chamfer_1_piece_5, bisect_by=Plane(origin=(37.293859649, -3.5, 0), z_dir=(0, 1, 0)), keep=Keep.TOP, mode=Mode.PRIVATE)
    chamfer_1_piece_5 = split(chamfer_1_piece_5, bisect_by=Plane(origin=(36.5, -1.600877193, 0), z_dir=(1, 0, 0)), keep=Keep.TOP, mode=Mode.PRIVATE)
    add(chamfer_1_piece_5)
    with BuildSketch(Plane(origin=(38, 0, 21.286731952), x_dir=(0.02749587661058563, -0.9996219169112968, 0), z_dir=(0, 0, -1))) as chamfer_1_piece_6_section:
        Polygon((CHAMFER_1_SIZE * 0.999621916911, CHAMFER_1_SIZE * 0.0274958766106), (-CHAMFER_1_SIZE * 0.0274958766106, CHAMFER_1_SIZE * 0.999621916911), (0, 0), align=None)
    chamfer_1_piece_6 = extrude(amount=32.286731952, mode=Mode.PRIVATE)
    chamfer_1_piece_6 = split(chamfer_1_piece_6, bisect_by=Plane(origin=(37.833333333, -3.666666667, -7), z_dir=(0, 0, -1)), keep=Keep.TOP, mode=Mode.PRIVATE)
    add(chamfer_1_piece_6)

    # 圆角1
    fillet_1_edges = [part_2.edges().sort_by_distance(p)[0] for p in [
        (20, -30, -9),
        (10, -33.5, 0),
        (20, -30, 9),
    ]]
    fillet(fillet_1_edges, radius=FILLET_1_R)

    # 圆角2
    fillet_2_edges = [part_2.edges().sort_by_distance(p)[0] for p in [
        (55, 3, -8.5),
        (55, -30, -8.5),
    ]]
    fillet(fillet_2_edges, radius=FILLET_2_R)

    # 圆角3
    fillet_3_edges = [part_2.edges().sort_by_distance(p)[0] for p in [
        (39, -22.45, 11),
        (39, -15.45, 11),
        (54, -15.45, -6),
        (54, -22.45, -6),
    ]]
    fillet(fillet_3_edges, radius=FILLET_3_R)

    # 圆角4
    fillet_4_edges = [part_2.edges().sort_by_distance(p)[0] for p in [
        (38, -18.95, 17.5),
        (55, -18.95, 17.5),
    ]]
    fillet(fillet_4_edges, radius=FILLET_4_R)


solid = part_2.part
